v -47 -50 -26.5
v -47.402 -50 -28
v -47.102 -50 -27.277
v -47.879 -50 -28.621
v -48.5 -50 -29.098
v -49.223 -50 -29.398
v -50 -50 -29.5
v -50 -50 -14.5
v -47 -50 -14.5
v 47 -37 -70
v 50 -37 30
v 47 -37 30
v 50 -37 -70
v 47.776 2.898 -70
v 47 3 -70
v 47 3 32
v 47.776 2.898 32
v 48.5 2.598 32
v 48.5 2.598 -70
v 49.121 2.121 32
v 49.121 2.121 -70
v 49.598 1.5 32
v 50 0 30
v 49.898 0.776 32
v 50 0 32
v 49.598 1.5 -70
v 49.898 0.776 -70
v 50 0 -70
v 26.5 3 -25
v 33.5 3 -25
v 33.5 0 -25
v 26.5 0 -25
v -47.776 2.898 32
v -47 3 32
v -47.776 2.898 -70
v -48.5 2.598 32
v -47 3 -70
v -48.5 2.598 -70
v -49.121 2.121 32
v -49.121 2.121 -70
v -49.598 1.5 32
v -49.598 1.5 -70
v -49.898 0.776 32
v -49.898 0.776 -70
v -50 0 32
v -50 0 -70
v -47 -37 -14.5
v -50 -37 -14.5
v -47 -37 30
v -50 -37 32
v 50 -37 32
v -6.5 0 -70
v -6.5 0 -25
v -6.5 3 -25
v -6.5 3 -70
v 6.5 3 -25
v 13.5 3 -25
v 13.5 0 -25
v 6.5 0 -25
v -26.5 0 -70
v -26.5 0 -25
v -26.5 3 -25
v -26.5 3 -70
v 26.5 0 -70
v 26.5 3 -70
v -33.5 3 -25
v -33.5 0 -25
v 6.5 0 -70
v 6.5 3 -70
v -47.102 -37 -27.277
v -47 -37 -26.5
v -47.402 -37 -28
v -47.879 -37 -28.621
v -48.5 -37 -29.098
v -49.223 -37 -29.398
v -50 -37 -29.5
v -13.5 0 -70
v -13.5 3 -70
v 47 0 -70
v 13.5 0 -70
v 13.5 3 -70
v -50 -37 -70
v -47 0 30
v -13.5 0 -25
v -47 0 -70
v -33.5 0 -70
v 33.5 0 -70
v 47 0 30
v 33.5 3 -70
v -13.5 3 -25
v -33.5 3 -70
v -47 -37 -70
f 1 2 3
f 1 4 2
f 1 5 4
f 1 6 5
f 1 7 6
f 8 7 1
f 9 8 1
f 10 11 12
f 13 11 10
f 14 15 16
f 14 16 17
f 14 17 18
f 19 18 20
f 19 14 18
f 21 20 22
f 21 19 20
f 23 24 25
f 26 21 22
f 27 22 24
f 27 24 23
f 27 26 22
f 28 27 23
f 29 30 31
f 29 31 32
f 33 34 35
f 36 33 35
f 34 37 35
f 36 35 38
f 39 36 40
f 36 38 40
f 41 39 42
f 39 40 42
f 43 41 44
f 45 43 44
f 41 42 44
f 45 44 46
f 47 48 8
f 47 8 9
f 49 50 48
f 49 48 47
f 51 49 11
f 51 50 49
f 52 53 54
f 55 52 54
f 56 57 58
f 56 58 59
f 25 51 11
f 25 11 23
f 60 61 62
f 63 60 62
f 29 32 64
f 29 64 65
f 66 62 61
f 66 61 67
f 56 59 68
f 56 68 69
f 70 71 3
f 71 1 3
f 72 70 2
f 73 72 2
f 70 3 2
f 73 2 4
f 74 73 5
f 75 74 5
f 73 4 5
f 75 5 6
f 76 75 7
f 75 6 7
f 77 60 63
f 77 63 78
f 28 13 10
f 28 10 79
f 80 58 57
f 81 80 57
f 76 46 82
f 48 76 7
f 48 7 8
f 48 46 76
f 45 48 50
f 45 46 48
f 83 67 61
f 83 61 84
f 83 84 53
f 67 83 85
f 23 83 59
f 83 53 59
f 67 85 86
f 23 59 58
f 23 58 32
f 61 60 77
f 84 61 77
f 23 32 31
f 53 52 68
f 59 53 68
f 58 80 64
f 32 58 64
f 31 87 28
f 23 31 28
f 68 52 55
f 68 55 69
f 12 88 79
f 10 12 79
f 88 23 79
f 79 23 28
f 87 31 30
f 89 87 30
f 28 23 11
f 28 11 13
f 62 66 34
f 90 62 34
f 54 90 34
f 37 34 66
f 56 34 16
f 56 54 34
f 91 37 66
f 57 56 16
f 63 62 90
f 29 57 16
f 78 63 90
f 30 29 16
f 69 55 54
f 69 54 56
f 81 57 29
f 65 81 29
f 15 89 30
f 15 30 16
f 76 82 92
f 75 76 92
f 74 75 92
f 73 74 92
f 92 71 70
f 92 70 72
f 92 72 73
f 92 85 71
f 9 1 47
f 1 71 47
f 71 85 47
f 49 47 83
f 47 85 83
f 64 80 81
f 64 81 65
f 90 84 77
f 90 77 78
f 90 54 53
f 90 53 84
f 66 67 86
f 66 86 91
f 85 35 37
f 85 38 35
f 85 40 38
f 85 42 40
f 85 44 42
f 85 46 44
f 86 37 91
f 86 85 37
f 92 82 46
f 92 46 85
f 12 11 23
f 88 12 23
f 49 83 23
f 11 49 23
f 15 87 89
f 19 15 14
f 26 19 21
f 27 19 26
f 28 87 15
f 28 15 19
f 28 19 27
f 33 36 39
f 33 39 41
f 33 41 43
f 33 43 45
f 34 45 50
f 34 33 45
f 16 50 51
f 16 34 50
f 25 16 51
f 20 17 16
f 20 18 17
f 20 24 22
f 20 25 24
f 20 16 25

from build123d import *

# Parameters (mm, degrees)
CROQUIS1_W              = 100
CROQUIS1_H              = 102
SALIENTE_EXTRUIR1_DEPTH = 3
CROQUIS2_W              = 3
CROQUIS2_H              = 15
SALIENTE_EXTRUIR2_DEPTH = 50
CROQUIS3_W              = 3
CROQUIS3_H              = 46.5
CROQUIS3_H_2            = 40.5
SALIENTE_EXTRUIR3_DEPTH = 37
CROQUIS4_W              = 97
CROQUIS4_H              = 37
SALIENTE_EXTRUIR4_DEPTH = 2
CROQUIS5_W              = 100
CROQUIS5_H              = 37
SALIENTE_EXTRUIR5_DEPTH = 3
REDONDEO2_R             = 3
REDONDEO3_R             = 3
CROQUIS7_W              = 7
CROQUIS7_H              = 6
CORTAR_EXTRUIR1_DEPTH   = 45


with BuildPart() as part:
    # Croquis1 → Saliente-Extruir1 (new body)
    with BuildSketch(Plane(origin=(0, 0, 0), x_dir=(1, 0, 0), z_dir=(0, 1, 0))):
        with Locations((0, 19)):
            Rectangle(CROQUIS1_W, CROQUIS1_H)
    extrude(amount=SALIENTE_EXTRUIR1_DEPTH)

    # Croquis2 → Saliente-Extruir2 (add)
    with BuildSketch(Plane.XZ):
        with Locations((-48.5, -22)):
            Rectangle(CROQUIS2_W, CROQUIS2_H)
    extrude(amount=SALIENTE_EXTRUIR2_DEPTH)

    # Croquis3 → Saliente-Extruir3 (add)
    with BuildSketch(Plane.XZ):
        with Locations((-48.5, 8.75)):
            Rectangle(CROQUIS3_W, CROQUIS3_H)
        with Locations((-48.5, -49.75)):
            Rectangle(CROQUIS3_W, CROQUIS3_H_2)
    extrude(amount=SALIENTE_EXTRUIR3_DEPTH)

    # Croquis4 → Saliente-Extruir4 (add)
    with BuildSketch(Plane.XY.offset(32)):
        with Locations((1.5, -18.5)):
            Rectangle(CROQUIS4_W, CROQUIS4_H)
    extrude(amount=-SALIENTE_EXTRUIR4_DEPTH)

    # Redondeo2
    redondeo2_edges = [part.edges().sort_by_distance(p)[0] for p in [
        (50, 3, -19),
        (-50, 3, -19),
    ]]
    fillet(redondeo2_edges, radius=REDONDEO2_R)

    # Redondeo3
    redondeo3_edges = [part.edges().sort_by_distance(p)[0] for p in [
        (-47, -43.5, -29.5),
    ]]
    fillet(redondeo3_edges, radius=REDONDEO3_R - 0.0001)  # a hair under: the kernel refuses the full size

    # Croquis7 → Cortar-Extruir1 (cut)
    with BuildSketch(Plane(origin=(0, 0, -70), x_dir=(-1, 0, 0), z_dir=(0, 0, -1))):
        with Locations((30, 0)):
            Rectangle(CROQUIS7_W, CROQUIS7_H)
        with Locations((10, 0)):
            Rectangle(CROQUIS7_W, CROQUIS7_H)
        with Locations((-10, 0)):
            Rectangle(CROQUIS7_W, CROQUIS7_H)
        with Locations((-30, 0)):
            Rectangle(CROQUIS7_W, CROQUIS7_H)
    extrude(amount=-CORTAR_EXTRUIR1_DEPTH, mode=Mode.SUBTRACT)


with BuildPart() as body_2:
    # Croquis5 → Saliente-Extruir5 (new body)
    with BuildSketch(Plane(origin=(50, 0, 0), x_dir=(0, 0, -1), z_dir=(1, 0, 0))):
        with Locations((20, -18.5)):
            Rectangle(CROQUIS5_W, CROQUIS5_H)
    extrude(amount=-SALIENTE_EXTRUIR5_DEPTH)


solid = Compound([part.part, body_2.part])
